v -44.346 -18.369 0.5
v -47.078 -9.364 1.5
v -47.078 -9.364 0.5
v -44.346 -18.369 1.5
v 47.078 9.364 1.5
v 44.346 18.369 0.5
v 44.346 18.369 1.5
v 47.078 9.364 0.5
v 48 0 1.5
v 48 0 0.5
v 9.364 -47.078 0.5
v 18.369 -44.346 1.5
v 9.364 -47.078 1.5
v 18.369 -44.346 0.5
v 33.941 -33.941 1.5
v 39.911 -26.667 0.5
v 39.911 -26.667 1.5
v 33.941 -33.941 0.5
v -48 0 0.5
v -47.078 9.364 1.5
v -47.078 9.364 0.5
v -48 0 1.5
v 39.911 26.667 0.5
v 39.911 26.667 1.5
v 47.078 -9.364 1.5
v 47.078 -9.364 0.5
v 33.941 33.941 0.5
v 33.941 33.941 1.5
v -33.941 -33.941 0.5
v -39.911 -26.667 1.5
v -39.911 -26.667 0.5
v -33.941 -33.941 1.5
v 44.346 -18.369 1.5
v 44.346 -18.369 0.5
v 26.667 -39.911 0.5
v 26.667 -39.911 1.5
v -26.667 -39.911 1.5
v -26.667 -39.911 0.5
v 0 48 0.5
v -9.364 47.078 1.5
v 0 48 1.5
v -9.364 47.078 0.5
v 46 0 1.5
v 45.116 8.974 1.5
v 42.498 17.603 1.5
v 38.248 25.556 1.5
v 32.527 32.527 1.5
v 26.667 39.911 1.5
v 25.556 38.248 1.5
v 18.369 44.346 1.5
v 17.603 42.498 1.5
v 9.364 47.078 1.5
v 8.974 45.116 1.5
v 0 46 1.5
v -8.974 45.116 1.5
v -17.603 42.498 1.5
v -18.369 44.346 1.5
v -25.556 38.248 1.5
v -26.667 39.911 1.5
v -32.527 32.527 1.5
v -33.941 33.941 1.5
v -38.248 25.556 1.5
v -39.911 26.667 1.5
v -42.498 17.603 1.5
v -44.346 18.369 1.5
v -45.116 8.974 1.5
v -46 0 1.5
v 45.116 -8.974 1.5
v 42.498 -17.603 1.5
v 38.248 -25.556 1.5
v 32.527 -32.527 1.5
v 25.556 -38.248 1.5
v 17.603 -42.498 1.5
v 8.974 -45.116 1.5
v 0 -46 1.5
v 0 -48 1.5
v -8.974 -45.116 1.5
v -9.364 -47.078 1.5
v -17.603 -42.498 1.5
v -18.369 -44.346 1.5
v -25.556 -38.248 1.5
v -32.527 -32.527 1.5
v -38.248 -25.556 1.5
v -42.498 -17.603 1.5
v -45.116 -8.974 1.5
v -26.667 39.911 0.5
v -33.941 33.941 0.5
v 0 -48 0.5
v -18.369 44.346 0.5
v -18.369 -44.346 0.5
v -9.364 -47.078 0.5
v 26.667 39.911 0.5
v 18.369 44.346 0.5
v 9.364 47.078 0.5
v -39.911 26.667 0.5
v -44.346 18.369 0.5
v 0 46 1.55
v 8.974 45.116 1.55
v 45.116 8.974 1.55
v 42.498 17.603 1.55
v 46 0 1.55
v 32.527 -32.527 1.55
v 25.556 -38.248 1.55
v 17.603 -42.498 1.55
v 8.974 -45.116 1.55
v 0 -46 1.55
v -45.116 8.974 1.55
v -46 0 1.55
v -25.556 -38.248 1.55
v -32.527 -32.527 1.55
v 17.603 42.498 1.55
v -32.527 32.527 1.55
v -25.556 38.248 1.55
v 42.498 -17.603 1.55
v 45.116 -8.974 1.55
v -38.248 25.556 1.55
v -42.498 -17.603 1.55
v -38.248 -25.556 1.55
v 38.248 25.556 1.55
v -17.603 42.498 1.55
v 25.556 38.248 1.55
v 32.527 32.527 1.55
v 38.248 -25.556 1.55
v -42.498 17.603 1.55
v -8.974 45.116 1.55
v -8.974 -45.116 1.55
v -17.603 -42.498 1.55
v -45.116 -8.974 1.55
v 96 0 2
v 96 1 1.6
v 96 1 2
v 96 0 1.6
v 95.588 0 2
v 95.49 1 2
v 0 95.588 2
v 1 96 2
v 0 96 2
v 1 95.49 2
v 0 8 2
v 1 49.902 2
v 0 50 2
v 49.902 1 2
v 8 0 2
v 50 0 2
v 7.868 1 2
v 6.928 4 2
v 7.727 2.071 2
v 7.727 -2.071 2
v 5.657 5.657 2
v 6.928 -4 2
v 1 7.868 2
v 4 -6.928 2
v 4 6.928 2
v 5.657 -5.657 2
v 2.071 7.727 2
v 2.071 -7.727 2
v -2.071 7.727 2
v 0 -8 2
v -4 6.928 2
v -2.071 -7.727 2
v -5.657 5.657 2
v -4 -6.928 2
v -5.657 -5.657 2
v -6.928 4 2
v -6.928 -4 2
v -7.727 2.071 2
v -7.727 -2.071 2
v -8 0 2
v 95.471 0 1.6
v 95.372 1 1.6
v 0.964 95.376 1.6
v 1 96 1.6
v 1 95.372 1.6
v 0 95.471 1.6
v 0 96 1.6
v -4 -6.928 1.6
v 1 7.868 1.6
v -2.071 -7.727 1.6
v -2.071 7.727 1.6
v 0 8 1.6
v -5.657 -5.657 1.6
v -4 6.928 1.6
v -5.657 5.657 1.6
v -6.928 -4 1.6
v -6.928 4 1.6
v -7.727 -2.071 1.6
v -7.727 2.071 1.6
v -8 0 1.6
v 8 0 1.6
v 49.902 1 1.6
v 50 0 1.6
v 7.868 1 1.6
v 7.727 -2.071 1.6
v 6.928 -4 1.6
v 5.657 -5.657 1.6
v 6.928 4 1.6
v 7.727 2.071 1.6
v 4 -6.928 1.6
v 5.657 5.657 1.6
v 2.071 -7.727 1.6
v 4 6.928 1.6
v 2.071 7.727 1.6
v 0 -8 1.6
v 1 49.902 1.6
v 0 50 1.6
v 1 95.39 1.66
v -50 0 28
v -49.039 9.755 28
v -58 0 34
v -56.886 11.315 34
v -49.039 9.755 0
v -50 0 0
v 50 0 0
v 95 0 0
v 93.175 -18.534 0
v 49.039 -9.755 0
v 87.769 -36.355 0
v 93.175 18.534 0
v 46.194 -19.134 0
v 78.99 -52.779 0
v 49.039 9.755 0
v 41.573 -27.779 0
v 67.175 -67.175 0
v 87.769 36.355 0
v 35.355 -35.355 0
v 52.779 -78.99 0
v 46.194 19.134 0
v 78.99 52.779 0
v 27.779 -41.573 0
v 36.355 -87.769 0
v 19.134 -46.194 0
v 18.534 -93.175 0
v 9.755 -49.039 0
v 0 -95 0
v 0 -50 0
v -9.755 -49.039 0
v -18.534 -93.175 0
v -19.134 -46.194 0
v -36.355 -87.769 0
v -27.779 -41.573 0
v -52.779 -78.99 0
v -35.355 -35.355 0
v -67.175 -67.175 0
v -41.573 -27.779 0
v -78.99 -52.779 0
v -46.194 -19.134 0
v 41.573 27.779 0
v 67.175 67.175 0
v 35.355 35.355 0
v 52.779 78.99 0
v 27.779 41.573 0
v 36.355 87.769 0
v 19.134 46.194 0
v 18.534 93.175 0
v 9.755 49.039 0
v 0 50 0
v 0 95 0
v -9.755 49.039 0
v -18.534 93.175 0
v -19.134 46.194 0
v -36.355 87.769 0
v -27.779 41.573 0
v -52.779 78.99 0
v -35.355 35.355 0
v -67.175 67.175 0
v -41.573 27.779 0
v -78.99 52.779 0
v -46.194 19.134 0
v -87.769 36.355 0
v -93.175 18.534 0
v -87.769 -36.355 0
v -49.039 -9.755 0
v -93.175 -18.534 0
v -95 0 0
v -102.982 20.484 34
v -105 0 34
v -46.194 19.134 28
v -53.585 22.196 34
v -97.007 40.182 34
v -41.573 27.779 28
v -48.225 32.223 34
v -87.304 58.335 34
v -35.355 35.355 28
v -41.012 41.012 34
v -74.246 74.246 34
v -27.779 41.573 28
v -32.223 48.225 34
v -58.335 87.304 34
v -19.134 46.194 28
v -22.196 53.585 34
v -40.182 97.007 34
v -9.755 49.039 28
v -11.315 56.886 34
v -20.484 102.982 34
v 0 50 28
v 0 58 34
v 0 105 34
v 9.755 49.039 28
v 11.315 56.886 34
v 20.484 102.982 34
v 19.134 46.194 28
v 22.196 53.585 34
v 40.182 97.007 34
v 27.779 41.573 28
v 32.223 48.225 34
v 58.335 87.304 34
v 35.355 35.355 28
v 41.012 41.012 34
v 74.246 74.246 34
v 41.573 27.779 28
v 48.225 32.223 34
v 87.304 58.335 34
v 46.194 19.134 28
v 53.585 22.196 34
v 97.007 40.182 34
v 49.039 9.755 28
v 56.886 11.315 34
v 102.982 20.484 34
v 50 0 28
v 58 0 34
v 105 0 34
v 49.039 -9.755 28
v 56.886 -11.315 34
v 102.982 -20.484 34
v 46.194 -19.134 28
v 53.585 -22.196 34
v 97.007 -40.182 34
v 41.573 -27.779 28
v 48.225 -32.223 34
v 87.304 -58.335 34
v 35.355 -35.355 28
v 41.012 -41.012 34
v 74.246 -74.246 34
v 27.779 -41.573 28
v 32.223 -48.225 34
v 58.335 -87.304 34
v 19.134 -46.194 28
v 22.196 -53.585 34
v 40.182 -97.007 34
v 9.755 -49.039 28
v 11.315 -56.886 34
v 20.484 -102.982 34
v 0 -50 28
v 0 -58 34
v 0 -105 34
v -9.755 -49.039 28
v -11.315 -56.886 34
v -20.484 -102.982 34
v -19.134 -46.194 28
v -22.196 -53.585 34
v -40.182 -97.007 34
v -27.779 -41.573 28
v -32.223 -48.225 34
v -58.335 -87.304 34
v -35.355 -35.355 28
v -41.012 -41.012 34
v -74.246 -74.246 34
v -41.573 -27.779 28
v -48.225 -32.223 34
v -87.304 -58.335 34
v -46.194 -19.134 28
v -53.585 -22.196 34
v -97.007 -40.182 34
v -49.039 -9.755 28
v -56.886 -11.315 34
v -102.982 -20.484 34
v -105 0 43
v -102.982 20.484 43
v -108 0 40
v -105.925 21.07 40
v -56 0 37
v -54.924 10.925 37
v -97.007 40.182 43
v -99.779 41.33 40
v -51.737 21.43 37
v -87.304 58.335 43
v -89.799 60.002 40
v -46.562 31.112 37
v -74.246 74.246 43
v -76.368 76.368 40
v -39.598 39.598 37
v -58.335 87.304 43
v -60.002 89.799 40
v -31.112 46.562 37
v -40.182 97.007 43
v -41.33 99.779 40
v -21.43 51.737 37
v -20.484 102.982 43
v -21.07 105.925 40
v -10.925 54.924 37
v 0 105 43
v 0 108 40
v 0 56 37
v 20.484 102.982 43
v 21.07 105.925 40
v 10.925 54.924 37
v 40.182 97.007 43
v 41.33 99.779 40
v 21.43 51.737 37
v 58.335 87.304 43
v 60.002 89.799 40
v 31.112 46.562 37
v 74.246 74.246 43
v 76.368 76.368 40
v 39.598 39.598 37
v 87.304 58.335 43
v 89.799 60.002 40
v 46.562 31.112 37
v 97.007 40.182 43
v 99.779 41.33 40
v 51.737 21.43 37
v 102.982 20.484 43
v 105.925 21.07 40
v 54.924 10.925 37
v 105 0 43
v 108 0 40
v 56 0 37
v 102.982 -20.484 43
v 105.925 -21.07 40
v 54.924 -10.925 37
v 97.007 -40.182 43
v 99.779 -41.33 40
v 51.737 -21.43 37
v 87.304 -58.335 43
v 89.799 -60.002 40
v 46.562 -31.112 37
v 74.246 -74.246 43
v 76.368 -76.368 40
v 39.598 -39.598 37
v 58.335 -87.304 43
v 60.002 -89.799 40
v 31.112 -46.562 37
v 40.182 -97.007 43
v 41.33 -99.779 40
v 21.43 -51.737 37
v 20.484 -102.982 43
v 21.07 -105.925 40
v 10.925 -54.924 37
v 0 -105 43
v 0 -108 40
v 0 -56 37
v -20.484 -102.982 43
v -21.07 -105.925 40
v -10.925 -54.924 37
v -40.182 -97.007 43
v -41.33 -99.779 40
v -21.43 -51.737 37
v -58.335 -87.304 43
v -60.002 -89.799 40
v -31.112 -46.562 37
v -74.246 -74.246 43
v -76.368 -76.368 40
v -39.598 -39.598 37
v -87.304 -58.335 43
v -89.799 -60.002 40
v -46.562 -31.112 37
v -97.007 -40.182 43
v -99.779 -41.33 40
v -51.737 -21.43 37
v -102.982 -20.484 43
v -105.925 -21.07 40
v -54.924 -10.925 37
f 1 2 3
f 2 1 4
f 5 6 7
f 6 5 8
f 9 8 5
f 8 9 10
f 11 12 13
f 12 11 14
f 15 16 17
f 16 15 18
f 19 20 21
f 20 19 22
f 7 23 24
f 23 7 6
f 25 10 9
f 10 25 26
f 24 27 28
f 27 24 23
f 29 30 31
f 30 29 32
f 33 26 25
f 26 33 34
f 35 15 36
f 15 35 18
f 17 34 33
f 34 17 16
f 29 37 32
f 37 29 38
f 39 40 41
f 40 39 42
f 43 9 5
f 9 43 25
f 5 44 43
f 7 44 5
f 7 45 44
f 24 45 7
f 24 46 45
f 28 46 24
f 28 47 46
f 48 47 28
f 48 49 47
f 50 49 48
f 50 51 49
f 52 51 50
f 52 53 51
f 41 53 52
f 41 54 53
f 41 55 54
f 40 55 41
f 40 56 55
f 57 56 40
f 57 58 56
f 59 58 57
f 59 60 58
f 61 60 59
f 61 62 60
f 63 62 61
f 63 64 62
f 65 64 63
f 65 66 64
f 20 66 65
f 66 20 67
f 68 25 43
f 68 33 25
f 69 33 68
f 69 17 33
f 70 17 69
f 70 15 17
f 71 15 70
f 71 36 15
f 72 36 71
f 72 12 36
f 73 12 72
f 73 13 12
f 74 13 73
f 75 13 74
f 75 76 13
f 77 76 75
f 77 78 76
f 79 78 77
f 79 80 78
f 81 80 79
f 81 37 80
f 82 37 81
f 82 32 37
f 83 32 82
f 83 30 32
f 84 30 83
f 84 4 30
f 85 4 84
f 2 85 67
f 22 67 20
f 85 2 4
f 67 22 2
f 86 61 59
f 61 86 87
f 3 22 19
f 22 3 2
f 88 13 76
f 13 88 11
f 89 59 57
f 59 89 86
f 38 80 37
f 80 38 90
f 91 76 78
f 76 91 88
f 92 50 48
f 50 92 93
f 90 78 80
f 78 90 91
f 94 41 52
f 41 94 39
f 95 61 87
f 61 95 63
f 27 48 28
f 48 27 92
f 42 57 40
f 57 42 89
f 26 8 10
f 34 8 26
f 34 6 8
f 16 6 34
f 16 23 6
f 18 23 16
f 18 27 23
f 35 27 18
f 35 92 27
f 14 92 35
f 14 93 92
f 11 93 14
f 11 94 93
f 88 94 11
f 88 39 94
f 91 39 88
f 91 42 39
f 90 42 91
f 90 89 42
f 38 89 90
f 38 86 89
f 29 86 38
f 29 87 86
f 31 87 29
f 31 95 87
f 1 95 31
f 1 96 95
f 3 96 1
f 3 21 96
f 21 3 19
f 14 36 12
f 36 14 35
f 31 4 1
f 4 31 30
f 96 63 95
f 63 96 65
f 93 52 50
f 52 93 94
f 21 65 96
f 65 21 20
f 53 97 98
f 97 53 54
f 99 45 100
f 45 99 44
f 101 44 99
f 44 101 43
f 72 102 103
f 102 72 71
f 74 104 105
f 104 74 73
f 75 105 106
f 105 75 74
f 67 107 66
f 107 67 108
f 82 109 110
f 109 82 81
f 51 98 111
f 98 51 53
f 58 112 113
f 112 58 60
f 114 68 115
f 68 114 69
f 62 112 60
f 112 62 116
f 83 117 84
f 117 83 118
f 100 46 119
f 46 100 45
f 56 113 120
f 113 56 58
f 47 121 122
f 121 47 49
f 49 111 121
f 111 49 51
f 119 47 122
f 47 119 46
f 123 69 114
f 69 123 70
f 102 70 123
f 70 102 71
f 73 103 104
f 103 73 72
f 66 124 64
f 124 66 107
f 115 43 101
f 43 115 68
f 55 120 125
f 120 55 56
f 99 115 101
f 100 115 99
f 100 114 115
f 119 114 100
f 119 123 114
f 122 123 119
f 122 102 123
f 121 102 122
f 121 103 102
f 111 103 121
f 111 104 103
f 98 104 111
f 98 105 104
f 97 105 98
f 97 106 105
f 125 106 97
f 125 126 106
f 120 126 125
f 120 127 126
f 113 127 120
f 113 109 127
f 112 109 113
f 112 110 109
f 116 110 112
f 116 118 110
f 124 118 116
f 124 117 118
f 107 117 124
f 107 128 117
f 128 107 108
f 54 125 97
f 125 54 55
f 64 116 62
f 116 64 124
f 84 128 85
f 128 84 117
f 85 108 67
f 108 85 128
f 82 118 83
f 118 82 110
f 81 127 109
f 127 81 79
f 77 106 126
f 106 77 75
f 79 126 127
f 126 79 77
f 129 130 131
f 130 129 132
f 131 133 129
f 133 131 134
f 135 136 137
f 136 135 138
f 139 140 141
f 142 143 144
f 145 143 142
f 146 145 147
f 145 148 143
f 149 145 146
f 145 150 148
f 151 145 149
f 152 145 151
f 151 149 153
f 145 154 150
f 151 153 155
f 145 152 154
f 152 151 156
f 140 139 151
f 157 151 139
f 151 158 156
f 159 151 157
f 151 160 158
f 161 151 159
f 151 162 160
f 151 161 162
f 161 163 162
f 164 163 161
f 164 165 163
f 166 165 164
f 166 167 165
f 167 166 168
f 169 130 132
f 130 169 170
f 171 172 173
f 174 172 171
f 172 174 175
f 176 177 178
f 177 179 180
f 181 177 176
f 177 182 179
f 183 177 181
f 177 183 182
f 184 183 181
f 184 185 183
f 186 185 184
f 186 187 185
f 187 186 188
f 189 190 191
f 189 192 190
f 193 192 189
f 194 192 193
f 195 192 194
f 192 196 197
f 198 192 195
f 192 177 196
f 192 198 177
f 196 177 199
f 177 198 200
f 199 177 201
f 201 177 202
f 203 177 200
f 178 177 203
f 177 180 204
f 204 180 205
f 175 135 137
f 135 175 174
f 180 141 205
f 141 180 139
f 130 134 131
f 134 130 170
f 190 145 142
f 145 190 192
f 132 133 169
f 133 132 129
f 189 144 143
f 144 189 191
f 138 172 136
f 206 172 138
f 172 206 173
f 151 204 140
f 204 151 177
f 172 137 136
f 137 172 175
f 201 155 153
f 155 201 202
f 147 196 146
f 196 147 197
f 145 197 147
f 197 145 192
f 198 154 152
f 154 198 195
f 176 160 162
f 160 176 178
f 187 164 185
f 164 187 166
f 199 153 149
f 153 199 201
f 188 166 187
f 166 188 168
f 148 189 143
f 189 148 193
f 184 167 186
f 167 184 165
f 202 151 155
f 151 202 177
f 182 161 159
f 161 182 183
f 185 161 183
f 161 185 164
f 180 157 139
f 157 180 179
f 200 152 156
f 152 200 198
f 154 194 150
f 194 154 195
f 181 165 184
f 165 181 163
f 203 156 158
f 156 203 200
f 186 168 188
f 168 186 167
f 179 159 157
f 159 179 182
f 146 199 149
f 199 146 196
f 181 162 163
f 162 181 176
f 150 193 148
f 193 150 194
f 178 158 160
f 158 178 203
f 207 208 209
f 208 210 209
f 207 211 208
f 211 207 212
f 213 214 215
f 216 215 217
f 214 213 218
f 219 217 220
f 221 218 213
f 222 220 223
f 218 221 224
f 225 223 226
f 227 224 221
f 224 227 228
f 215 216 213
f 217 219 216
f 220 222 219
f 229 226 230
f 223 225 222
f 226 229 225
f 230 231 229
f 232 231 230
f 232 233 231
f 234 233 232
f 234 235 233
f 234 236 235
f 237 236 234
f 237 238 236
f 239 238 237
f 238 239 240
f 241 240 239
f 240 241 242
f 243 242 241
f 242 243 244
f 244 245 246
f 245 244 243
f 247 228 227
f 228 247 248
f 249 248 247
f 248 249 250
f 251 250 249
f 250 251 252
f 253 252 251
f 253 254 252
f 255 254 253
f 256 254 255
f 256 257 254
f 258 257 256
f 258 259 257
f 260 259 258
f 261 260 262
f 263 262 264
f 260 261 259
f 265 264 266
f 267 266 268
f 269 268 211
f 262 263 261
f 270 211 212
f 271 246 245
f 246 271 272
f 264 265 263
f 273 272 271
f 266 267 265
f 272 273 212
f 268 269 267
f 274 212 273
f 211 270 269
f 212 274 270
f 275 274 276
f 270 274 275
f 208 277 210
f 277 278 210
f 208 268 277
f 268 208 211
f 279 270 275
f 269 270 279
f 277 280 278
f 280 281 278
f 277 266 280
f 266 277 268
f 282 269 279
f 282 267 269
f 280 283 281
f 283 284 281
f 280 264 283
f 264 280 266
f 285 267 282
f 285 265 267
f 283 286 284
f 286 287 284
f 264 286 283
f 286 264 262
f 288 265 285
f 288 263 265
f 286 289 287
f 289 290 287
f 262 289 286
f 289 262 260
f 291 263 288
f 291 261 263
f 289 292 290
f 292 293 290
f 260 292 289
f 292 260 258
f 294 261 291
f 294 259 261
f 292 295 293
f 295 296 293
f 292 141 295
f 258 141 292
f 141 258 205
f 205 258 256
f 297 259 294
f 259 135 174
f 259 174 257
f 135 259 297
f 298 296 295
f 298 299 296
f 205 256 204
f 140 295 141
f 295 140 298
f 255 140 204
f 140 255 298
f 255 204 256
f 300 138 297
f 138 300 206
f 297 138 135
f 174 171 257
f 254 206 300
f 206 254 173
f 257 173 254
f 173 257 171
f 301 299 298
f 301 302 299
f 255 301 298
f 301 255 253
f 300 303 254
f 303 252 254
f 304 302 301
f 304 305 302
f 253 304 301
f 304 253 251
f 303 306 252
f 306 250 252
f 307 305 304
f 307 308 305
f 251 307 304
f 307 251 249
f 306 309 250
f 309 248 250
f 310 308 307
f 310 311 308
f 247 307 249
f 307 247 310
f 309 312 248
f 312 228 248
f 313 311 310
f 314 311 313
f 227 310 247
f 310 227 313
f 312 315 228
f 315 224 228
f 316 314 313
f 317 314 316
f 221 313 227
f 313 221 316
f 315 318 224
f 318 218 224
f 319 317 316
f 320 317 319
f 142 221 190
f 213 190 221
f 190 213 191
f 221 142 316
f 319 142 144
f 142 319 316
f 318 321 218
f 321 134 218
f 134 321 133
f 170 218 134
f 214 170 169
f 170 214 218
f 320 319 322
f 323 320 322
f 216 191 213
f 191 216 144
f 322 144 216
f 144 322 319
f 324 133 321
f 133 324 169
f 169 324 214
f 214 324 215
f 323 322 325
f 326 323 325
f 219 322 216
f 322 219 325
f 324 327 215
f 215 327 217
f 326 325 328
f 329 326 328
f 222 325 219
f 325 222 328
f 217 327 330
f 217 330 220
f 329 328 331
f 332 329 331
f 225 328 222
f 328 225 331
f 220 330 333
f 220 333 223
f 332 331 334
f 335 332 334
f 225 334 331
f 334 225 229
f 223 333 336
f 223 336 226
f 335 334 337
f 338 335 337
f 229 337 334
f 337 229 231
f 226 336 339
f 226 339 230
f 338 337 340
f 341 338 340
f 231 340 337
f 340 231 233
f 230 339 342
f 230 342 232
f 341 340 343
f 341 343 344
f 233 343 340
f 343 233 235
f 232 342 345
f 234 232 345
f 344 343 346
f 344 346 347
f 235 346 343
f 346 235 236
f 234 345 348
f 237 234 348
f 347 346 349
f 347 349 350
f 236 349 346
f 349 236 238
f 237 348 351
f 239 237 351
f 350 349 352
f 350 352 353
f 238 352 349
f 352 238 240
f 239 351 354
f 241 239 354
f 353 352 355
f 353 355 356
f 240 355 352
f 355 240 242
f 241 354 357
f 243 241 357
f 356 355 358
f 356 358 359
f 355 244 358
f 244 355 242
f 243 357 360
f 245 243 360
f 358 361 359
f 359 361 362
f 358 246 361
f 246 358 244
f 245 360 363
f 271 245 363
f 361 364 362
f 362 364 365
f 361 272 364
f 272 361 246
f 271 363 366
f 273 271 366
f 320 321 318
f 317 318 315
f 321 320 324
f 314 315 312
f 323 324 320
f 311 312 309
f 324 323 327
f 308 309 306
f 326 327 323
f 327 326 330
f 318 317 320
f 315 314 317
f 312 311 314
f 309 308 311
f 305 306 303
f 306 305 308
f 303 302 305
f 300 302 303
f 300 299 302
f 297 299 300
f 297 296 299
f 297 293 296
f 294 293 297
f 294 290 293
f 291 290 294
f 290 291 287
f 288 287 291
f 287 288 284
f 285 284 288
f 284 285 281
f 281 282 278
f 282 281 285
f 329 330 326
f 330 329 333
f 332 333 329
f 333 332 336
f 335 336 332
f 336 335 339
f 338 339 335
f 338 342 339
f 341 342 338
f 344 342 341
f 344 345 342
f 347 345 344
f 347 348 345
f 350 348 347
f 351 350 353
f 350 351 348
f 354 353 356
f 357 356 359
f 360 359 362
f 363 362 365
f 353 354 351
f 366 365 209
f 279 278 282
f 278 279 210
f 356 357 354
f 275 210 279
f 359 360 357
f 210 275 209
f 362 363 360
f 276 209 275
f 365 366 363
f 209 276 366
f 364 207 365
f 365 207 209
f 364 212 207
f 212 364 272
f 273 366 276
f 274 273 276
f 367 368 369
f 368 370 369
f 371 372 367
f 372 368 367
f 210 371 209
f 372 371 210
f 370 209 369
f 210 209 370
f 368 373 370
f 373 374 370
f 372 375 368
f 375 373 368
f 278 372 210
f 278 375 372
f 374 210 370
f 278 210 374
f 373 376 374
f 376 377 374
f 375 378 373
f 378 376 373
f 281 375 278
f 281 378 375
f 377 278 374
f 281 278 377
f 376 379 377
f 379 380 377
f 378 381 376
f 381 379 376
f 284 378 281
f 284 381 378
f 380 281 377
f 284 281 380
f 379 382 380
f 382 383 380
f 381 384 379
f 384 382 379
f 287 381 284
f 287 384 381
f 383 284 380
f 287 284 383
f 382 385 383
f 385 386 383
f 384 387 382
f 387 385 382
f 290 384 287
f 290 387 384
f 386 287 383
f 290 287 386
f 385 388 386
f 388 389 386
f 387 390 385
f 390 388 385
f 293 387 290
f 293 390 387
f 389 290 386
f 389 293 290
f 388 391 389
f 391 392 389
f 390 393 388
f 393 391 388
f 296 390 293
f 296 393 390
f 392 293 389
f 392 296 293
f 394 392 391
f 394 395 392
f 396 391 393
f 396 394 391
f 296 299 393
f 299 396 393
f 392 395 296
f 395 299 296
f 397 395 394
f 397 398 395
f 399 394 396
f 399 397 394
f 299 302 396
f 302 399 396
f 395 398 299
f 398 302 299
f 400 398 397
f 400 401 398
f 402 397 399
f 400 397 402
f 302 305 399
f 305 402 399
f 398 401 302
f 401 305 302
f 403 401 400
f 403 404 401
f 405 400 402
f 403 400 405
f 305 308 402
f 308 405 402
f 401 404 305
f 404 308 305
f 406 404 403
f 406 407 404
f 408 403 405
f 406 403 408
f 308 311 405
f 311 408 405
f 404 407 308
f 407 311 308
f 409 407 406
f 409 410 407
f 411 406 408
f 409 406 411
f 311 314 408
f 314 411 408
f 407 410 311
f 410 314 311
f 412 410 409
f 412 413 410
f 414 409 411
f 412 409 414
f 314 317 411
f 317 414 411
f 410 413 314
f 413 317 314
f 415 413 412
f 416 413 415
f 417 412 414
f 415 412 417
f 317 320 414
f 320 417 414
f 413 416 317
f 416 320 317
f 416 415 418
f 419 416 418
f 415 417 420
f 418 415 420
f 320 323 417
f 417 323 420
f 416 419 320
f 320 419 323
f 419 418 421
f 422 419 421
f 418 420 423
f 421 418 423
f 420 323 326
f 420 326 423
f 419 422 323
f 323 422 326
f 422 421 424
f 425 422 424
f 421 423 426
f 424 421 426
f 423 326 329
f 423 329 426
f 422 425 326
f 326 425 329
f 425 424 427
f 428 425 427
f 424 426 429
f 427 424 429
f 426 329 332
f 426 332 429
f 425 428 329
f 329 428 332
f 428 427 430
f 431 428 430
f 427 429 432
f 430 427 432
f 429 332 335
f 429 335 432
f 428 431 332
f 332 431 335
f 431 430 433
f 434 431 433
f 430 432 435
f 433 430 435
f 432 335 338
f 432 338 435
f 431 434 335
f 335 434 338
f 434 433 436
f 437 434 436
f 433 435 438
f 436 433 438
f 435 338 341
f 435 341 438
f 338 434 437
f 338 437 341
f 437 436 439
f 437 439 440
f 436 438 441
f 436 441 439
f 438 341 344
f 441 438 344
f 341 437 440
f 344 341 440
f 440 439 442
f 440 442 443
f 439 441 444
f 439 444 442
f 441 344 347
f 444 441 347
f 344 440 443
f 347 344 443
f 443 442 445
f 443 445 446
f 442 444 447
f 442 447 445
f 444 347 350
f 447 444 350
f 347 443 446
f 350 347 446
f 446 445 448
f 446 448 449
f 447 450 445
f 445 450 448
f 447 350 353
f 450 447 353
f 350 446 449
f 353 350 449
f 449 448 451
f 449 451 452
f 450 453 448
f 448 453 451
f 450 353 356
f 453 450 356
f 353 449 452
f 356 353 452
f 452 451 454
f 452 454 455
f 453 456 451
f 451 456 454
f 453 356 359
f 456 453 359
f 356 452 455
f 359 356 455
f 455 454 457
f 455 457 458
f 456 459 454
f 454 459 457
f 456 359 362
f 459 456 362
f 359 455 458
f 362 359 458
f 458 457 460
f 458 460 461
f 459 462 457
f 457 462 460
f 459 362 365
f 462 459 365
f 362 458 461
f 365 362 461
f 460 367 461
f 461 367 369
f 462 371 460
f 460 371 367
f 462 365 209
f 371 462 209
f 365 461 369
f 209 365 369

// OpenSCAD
// 大型体育场 (直径 ~210, 环形看台 + 场地 + 顶棚)
// 不追求低模, 圆环用较高 $fn
$fn = 32;

module bowl() {
  color("#8a8a82") rotate_extrude()
    polygon([[50, 0], [95, 0], [105, 34], [58, 34], [50, 28]]);
}

module roof() {
  color("#66665f") rotate_extrude()
    polygon([[58, 34], [108, 40], [105, 43], [56, 37]]);
}

module field() {
  color("#2f7d32") cylinder(r = 48, h = 1, $fn = 32);
  color("#ffffff") cylinder(r = 46, h = 1.05, $fn = 32);
  color("#ffffff") translate([0, 0, 1.1]) cube([96, 1, 0.4]);
  color("#ffffff") translate([0, 0, 1.1]) cube([1, 96, 0.4]);
  color("#ffffff") translate([0, 0, 1.1]) cylinder(r = 8, h = 0.4, $fn = 24);
}

bowl();
roof();
translate([0, 0, 0.5]) field();
